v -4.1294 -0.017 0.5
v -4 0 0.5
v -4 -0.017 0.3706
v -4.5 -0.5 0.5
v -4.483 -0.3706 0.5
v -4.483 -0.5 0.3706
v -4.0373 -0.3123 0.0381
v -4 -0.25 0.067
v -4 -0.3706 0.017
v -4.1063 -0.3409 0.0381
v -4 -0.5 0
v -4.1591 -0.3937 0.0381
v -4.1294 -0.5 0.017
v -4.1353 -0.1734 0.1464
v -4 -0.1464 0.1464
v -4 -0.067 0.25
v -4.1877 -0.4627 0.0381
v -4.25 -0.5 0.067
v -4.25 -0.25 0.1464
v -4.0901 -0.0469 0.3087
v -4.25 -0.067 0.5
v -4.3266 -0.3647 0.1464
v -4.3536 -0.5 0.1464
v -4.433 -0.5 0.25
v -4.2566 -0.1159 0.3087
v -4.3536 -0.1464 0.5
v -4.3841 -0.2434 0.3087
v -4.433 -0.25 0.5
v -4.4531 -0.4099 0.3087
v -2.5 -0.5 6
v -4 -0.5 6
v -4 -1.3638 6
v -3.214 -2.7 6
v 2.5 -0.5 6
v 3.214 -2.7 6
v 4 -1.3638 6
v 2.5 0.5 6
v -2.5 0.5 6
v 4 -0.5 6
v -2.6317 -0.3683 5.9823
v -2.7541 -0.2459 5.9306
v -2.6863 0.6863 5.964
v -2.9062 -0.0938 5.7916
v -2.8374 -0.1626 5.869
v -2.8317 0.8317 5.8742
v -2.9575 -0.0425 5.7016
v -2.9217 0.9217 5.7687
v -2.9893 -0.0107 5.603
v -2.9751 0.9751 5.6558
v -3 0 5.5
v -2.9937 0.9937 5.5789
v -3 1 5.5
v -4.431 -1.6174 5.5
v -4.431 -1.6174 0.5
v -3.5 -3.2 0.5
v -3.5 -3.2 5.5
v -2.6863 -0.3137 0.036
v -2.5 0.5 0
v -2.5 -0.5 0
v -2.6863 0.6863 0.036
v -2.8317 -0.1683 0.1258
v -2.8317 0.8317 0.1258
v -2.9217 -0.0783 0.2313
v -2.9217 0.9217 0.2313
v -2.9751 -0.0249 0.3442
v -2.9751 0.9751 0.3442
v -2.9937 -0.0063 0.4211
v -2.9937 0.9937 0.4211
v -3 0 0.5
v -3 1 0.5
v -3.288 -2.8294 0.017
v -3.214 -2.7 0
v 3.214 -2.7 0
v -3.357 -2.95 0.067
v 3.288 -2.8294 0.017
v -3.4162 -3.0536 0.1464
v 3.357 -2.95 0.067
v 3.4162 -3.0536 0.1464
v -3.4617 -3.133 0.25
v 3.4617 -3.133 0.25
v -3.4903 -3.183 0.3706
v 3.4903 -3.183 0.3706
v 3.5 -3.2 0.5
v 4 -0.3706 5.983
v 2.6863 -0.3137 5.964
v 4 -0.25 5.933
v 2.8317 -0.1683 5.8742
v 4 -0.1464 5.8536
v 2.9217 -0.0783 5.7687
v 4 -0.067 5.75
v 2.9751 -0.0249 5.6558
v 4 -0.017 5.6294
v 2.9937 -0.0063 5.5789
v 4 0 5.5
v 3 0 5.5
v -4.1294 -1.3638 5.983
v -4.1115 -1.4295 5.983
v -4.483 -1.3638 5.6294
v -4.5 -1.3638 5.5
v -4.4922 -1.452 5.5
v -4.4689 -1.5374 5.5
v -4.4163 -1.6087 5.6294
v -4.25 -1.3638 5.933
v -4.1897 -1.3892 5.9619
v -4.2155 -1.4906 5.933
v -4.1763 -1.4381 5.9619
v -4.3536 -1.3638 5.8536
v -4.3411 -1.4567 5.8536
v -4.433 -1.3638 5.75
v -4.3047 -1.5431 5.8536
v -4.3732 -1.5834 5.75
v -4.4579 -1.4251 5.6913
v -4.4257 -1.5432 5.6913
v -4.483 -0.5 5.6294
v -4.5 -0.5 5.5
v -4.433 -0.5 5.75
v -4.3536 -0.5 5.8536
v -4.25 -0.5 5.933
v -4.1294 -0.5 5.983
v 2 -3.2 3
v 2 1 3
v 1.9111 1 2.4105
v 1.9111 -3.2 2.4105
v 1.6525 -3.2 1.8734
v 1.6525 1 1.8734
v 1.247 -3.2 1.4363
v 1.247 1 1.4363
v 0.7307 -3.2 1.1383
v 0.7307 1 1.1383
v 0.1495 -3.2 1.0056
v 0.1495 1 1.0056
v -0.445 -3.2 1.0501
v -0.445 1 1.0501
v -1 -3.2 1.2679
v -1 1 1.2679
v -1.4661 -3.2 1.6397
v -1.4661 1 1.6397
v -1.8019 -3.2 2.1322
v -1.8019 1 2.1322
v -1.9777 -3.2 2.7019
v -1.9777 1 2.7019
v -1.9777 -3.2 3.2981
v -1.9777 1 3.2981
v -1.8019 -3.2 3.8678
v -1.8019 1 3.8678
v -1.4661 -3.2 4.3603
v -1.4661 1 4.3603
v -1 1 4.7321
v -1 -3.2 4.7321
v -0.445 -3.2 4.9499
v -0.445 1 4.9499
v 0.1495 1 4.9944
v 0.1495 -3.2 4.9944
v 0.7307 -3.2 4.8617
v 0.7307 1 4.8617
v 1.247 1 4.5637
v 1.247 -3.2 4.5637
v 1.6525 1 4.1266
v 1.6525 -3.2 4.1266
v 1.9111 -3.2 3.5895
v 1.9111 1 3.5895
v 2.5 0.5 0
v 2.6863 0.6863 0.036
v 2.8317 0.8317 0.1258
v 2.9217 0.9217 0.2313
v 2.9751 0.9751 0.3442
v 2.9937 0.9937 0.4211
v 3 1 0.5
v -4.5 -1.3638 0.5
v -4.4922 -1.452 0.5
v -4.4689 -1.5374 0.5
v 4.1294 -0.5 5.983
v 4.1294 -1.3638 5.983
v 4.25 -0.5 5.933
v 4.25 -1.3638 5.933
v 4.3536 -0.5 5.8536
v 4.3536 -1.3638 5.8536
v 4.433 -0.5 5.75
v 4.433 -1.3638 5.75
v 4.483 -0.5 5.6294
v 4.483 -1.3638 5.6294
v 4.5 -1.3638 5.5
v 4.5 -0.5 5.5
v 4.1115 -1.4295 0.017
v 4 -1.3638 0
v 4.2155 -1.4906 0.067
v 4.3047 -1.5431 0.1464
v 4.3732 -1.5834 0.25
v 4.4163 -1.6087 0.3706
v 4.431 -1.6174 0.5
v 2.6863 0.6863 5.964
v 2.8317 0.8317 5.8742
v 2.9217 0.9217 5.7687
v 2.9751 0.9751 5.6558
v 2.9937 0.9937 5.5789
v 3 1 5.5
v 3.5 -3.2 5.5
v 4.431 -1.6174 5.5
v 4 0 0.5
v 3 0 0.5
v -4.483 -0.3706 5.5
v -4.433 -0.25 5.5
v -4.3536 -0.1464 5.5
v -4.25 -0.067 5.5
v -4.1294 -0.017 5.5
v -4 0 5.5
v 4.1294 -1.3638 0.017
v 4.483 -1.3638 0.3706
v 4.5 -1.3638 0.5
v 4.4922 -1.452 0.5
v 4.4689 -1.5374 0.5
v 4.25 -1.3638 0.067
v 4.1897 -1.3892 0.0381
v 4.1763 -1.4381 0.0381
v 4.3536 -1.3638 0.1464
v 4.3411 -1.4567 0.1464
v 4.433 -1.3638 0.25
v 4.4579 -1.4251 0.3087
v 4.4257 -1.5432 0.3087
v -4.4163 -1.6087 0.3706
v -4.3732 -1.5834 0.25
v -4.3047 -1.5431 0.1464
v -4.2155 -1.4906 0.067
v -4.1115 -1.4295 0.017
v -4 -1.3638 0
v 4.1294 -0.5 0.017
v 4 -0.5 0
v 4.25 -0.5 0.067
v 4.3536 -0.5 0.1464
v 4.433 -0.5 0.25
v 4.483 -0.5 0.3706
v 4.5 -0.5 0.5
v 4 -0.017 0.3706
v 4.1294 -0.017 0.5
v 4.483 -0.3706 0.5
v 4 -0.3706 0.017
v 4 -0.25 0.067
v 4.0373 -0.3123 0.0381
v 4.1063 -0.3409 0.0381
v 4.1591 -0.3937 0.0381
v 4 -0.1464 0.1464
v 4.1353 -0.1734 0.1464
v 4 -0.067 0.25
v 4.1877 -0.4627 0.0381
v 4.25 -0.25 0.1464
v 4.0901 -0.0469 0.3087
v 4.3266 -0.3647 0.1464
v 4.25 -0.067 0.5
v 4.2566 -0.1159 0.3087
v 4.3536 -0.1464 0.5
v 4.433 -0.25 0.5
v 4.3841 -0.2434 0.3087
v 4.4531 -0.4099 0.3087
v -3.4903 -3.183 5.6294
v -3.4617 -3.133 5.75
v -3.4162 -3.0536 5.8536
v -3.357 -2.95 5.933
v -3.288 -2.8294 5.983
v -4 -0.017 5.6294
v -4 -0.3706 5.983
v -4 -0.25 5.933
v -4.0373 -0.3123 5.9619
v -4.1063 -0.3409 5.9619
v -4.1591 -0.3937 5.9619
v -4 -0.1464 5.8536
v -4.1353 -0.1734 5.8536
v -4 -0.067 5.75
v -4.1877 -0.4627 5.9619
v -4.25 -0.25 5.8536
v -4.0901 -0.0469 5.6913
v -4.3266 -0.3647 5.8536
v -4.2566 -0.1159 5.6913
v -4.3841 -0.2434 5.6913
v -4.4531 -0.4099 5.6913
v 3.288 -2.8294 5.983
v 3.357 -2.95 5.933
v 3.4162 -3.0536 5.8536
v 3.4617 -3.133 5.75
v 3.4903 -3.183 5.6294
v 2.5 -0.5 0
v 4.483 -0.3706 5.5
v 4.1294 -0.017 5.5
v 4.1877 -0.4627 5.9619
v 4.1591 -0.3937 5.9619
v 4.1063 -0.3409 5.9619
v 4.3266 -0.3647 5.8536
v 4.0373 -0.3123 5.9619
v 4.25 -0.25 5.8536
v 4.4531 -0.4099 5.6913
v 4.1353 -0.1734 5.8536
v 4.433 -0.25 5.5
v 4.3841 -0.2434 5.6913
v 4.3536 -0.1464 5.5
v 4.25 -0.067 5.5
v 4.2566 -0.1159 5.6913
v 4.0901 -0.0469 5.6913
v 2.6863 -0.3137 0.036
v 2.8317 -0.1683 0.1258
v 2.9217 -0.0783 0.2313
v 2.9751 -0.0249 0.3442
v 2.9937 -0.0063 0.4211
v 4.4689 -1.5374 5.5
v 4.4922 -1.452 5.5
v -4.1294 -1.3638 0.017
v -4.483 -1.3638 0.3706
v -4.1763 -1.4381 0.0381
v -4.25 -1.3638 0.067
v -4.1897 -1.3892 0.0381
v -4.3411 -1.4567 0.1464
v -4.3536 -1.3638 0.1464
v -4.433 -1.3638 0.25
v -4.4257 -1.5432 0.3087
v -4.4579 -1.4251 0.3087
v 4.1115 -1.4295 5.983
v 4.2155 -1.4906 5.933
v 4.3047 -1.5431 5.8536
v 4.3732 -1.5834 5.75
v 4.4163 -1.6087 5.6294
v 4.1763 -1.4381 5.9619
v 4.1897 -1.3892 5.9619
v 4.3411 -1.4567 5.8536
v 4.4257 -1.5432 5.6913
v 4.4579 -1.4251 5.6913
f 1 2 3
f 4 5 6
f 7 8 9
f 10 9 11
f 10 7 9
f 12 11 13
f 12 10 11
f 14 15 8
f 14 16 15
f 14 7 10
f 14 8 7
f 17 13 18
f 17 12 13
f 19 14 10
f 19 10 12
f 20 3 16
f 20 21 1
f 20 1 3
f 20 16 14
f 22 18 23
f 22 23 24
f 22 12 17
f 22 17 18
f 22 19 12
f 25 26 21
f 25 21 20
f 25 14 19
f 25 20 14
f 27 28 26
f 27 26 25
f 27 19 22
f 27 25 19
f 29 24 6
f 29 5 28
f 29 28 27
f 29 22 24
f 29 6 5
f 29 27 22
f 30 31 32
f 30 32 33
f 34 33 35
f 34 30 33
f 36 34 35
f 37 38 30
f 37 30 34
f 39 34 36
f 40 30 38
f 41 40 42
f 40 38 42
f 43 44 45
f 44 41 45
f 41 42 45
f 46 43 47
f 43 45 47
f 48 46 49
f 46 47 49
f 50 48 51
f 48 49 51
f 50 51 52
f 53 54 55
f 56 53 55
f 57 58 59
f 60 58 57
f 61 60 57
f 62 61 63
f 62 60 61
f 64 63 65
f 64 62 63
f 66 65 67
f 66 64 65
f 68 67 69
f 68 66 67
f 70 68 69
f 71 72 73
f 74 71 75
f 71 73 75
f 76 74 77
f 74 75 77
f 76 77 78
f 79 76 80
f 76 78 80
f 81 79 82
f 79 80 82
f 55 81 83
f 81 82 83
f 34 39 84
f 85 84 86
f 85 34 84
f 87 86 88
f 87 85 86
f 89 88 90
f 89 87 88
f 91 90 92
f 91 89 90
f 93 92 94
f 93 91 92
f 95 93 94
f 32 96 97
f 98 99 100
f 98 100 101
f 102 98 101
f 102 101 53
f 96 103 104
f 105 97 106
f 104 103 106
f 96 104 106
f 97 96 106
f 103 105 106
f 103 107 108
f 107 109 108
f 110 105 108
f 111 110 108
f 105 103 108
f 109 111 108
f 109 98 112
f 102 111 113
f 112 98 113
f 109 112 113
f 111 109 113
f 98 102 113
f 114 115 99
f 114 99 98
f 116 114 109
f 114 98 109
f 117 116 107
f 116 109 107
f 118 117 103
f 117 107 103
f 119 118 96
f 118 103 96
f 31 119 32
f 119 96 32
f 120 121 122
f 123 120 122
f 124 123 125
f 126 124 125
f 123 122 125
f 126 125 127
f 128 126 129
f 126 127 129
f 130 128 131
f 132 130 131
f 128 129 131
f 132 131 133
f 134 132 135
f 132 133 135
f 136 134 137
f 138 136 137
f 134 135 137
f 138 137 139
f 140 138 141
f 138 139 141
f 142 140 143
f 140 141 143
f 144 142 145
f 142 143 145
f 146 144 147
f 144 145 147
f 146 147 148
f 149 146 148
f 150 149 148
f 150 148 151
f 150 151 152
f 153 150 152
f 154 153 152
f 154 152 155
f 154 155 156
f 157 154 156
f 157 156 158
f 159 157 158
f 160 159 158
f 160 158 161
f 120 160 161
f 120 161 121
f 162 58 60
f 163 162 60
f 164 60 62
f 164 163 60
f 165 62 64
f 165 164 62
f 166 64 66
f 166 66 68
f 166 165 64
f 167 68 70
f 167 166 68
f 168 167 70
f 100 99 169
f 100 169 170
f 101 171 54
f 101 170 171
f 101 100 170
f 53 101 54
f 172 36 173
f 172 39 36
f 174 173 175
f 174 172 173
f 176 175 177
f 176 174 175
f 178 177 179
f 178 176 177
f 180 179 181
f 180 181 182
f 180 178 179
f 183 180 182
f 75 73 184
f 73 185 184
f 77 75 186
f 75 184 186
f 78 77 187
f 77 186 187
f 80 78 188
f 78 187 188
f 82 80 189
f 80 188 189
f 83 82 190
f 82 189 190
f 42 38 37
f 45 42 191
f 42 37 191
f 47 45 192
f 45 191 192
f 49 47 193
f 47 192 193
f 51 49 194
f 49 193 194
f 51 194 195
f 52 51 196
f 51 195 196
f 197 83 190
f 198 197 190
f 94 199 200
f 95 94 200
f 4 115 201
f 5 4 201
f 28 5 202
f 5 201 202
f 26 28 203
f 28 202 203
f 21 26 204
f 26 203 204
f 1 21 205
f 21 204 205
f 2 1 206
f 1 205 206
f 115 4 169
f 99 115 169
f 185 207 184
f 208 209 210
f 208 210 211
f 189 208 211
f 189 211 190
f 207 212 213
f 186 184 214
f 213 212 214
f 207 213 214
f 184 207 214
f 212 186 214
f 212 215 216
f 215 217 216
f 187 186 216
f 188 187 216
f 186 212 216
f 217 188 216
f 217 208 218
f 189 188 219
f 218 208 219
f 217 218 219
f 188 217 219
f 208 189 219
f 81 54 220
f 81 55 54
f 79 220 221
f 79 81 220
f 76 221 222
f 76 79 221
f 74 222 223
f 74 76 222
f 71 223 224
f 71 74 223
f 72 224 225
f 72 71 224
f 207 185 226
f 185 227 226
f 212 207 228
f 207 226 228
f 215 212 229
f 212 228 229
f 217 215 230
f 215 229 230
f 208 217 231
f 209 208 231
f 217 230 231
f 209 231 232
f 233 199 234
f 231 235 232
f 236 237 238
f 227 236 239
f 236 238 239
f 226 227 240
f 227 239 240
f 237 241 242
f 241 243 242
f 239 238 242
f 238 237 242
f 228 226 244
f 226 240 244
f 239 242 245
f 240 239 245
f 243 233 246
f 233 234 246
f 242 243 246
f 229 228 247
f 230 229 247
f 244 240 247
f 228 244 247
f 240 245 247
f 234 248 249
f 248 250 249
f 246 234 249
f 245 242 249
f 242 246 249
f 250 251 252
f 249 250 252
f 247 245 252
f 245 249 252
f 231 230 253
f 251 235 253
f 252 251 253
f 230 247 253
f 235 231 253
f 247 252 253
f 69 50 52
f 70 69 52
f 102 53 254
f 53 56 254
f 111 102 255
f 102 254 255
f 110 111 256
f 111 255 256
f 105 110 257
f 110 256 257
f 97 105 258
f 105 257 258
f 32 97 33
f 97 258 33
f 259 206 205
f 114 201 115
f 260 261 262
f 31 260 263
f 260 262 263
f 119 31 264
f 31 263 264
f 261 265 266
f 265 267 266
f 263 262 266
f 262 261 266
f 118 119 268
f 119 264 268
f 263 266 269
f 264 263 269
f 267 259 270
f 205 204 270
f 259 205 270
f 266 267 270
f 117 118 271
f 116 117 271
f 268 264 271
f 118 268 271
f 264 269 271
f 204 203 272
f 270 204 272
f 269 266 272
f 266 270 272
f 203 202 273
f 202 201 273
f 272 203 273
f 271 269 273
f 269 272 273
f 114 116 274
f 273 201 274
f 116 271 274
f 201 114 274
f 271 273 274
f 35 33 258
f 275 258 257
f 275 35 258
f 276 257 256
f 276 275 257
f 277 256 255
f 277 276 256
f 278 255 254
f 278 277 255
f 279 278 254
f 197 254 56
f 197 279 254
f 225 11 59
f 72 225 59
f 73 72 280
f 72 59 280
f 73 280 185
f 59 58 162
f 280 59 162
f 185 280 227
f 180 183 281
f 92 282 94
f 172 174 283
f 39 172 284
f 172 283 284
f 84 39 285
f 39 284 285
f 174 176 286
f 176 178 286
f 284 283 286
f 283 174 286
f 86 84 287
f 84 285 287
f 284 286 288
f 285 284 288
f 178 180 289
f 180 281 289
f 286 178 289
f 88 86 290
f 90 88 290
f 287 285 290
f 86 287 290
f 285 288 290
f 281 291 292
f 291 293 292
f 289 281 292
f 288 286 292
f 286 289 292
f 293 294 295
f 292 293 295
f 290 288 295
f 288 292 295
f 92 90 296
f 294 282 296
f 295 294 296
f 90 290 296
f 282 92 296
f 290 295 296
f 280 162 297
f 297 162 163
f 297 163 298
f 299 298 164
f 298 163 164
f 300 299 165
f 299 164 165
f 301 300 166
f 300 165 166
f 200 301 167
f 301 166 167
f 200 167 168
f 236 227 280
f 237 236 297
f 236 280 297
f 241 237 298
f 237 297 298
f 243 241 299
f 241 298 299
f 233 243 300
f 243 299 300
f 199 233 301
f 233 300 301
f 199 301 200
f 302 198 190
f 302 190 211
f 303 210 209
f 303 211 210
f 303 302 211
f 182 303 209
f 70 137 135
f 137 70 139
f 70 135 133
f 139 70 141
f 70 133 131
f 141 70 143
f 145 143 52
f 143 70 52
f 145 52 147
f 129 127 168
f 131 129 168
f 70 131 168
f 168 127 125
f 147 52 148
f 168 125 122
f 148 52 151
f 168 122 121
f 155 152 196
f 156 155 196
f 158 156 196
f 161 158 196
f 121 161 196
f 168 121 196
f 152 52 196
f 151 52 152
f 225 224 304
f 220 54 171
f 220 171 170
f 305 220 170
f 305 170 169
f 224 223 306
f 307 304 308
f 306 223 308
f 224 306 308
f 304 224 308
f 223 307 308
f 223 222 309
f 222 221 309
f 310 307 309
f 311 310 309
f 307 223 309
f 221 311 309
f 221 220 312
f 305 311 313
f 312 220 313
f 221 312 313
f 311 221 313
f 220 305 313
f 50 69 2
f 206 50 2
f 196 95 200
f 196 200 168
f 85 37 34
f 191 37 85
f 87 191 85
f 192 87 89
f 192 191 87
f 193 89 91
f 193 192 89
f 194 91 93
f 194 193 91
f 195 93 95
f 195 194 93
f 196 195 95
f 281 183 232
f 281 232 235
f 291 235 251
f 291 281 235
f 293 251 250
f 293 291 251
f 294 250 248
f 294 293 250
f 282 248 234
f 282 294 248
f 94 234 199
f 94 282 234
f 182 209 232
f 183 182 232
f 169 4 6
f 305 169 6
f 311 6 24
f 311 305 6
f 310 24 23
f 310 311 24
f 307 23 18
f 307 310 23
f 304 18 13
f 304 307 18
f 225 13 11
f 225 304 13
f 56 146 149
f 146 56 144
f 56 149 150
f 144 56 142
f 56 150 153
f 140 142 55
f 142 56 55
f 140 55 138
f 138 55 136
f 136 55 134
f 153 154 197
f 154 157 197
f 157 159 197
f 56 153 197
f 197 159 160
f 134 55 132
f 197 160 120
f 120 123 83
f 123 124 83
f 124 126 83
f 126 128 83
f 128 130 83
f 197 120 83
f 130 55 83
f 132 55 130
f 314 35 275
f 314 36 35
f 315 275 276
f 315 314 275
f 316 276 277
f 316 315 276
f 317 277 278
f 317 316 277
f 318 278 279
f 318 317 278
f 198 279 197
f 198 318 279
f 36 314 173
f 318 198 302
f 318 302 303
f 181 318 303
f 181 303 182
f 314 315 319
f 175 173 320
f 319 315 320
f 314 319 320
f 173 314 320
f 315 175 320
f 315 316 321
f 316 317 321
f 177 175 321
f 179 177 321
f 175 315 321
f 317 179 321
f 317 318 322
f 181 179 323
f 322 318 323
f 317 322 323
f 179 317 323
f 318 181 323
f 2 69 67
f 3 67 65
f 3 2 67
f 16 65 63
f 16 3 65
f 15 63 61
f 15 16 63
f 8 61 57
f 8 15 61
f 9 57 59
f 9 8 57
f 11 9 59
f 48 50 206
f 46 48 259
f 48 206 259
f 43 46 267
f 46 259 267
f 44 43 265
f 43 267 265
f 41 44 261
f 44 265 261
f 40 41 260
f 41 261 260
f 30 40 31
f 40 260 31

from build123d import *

# Parameters (mm, degrees)
SALIENTE_EXTRUIR2_DEPTH = 6
CROQUIS2_W              = 6
CROQUIS2_H              = 1
SALIENTE_EXTRUIR3_DEPTH = 6
CROQUIS3_R              = 2
CORTAR_EXTRUIR1_DEPTH   = 5.2
REDONDEO1_R             = 0.5


with BuildPart() as part:
    # Croquis1 → Saliente-Extruir2 (new body)
    with BuildSketch(Plane.XY):
        Polygon((0, 0), (-4.5, 0), (-4.5, -1.5), (-3.5, -3.2), (0, -3.2), align=None)
        Polygon((4.5, 0), (0, 0), (0, -3.2), (3.5, -3.2), (4.5, -1.5), align=None)
    extrude(amount=SALIENTE_EXTRUIR2_DEPTH)

    # Croquis2 → Saliente-Extruir3 (add)
    with BuildSketch(Plane.XY.offset(6)):
        with Locations((0, 0.5)):
            Rectangle(CROQUIS2_W, CROQUIS2_H)
    extrude(amount=-SALIENTE_EXTRUIR3_DEPTH)

    # Croquis3 → Cortar-Extruir1 (cut, through all)
    with BuildSketch(Plane(origin=(0, 1, 0), x_dir=(1, 0, 0), z_dir=(0, 1, 0))):
        with Locations((0, -3)):
            Circle(CROQUIS3_R)
    extrude(amount=-CORTAR_EXTRUIR1_DEPTH, mode=Mode.SUBTRACT)

    # Redondeo1
    redondeo1_edges = [part.edges().sort_by_distance(p)[0] for p in [
        (0, -3.2, 6),
        (-4.5, 0, 3),
        (4.5, 0, 3),
        (4.5, -1.5, 3),
        (-4.5, -1.5, 3),
        (4, -2.35, 6),
        (4.5, -0.75, 6),
        (3.75, 0, 0),
        (3.75, 0, 6),
        (-3, 0.5, 0),
        (0, 1, 6),
        (3, 0.5, 6),
        (0, 1, 0),
        (3, 0.5, 0),
        (-3.75, 0, 6),
        (-3, 0.5, 6),
        (-4.5, -0.75, 6),
        (-3.75, 0, 0),
        (4.5, -0.75, 0),
        (-4, -2.35, 6),
        (4, -2.35, 0),
        (0, -3.2, 0),
        (-4, -2.35, 0),
        (-4.5, -0.75, 0),
    ]]
    fillet(redondeo1_edges, radius=REDONDEO1_R)


solid = part.part
